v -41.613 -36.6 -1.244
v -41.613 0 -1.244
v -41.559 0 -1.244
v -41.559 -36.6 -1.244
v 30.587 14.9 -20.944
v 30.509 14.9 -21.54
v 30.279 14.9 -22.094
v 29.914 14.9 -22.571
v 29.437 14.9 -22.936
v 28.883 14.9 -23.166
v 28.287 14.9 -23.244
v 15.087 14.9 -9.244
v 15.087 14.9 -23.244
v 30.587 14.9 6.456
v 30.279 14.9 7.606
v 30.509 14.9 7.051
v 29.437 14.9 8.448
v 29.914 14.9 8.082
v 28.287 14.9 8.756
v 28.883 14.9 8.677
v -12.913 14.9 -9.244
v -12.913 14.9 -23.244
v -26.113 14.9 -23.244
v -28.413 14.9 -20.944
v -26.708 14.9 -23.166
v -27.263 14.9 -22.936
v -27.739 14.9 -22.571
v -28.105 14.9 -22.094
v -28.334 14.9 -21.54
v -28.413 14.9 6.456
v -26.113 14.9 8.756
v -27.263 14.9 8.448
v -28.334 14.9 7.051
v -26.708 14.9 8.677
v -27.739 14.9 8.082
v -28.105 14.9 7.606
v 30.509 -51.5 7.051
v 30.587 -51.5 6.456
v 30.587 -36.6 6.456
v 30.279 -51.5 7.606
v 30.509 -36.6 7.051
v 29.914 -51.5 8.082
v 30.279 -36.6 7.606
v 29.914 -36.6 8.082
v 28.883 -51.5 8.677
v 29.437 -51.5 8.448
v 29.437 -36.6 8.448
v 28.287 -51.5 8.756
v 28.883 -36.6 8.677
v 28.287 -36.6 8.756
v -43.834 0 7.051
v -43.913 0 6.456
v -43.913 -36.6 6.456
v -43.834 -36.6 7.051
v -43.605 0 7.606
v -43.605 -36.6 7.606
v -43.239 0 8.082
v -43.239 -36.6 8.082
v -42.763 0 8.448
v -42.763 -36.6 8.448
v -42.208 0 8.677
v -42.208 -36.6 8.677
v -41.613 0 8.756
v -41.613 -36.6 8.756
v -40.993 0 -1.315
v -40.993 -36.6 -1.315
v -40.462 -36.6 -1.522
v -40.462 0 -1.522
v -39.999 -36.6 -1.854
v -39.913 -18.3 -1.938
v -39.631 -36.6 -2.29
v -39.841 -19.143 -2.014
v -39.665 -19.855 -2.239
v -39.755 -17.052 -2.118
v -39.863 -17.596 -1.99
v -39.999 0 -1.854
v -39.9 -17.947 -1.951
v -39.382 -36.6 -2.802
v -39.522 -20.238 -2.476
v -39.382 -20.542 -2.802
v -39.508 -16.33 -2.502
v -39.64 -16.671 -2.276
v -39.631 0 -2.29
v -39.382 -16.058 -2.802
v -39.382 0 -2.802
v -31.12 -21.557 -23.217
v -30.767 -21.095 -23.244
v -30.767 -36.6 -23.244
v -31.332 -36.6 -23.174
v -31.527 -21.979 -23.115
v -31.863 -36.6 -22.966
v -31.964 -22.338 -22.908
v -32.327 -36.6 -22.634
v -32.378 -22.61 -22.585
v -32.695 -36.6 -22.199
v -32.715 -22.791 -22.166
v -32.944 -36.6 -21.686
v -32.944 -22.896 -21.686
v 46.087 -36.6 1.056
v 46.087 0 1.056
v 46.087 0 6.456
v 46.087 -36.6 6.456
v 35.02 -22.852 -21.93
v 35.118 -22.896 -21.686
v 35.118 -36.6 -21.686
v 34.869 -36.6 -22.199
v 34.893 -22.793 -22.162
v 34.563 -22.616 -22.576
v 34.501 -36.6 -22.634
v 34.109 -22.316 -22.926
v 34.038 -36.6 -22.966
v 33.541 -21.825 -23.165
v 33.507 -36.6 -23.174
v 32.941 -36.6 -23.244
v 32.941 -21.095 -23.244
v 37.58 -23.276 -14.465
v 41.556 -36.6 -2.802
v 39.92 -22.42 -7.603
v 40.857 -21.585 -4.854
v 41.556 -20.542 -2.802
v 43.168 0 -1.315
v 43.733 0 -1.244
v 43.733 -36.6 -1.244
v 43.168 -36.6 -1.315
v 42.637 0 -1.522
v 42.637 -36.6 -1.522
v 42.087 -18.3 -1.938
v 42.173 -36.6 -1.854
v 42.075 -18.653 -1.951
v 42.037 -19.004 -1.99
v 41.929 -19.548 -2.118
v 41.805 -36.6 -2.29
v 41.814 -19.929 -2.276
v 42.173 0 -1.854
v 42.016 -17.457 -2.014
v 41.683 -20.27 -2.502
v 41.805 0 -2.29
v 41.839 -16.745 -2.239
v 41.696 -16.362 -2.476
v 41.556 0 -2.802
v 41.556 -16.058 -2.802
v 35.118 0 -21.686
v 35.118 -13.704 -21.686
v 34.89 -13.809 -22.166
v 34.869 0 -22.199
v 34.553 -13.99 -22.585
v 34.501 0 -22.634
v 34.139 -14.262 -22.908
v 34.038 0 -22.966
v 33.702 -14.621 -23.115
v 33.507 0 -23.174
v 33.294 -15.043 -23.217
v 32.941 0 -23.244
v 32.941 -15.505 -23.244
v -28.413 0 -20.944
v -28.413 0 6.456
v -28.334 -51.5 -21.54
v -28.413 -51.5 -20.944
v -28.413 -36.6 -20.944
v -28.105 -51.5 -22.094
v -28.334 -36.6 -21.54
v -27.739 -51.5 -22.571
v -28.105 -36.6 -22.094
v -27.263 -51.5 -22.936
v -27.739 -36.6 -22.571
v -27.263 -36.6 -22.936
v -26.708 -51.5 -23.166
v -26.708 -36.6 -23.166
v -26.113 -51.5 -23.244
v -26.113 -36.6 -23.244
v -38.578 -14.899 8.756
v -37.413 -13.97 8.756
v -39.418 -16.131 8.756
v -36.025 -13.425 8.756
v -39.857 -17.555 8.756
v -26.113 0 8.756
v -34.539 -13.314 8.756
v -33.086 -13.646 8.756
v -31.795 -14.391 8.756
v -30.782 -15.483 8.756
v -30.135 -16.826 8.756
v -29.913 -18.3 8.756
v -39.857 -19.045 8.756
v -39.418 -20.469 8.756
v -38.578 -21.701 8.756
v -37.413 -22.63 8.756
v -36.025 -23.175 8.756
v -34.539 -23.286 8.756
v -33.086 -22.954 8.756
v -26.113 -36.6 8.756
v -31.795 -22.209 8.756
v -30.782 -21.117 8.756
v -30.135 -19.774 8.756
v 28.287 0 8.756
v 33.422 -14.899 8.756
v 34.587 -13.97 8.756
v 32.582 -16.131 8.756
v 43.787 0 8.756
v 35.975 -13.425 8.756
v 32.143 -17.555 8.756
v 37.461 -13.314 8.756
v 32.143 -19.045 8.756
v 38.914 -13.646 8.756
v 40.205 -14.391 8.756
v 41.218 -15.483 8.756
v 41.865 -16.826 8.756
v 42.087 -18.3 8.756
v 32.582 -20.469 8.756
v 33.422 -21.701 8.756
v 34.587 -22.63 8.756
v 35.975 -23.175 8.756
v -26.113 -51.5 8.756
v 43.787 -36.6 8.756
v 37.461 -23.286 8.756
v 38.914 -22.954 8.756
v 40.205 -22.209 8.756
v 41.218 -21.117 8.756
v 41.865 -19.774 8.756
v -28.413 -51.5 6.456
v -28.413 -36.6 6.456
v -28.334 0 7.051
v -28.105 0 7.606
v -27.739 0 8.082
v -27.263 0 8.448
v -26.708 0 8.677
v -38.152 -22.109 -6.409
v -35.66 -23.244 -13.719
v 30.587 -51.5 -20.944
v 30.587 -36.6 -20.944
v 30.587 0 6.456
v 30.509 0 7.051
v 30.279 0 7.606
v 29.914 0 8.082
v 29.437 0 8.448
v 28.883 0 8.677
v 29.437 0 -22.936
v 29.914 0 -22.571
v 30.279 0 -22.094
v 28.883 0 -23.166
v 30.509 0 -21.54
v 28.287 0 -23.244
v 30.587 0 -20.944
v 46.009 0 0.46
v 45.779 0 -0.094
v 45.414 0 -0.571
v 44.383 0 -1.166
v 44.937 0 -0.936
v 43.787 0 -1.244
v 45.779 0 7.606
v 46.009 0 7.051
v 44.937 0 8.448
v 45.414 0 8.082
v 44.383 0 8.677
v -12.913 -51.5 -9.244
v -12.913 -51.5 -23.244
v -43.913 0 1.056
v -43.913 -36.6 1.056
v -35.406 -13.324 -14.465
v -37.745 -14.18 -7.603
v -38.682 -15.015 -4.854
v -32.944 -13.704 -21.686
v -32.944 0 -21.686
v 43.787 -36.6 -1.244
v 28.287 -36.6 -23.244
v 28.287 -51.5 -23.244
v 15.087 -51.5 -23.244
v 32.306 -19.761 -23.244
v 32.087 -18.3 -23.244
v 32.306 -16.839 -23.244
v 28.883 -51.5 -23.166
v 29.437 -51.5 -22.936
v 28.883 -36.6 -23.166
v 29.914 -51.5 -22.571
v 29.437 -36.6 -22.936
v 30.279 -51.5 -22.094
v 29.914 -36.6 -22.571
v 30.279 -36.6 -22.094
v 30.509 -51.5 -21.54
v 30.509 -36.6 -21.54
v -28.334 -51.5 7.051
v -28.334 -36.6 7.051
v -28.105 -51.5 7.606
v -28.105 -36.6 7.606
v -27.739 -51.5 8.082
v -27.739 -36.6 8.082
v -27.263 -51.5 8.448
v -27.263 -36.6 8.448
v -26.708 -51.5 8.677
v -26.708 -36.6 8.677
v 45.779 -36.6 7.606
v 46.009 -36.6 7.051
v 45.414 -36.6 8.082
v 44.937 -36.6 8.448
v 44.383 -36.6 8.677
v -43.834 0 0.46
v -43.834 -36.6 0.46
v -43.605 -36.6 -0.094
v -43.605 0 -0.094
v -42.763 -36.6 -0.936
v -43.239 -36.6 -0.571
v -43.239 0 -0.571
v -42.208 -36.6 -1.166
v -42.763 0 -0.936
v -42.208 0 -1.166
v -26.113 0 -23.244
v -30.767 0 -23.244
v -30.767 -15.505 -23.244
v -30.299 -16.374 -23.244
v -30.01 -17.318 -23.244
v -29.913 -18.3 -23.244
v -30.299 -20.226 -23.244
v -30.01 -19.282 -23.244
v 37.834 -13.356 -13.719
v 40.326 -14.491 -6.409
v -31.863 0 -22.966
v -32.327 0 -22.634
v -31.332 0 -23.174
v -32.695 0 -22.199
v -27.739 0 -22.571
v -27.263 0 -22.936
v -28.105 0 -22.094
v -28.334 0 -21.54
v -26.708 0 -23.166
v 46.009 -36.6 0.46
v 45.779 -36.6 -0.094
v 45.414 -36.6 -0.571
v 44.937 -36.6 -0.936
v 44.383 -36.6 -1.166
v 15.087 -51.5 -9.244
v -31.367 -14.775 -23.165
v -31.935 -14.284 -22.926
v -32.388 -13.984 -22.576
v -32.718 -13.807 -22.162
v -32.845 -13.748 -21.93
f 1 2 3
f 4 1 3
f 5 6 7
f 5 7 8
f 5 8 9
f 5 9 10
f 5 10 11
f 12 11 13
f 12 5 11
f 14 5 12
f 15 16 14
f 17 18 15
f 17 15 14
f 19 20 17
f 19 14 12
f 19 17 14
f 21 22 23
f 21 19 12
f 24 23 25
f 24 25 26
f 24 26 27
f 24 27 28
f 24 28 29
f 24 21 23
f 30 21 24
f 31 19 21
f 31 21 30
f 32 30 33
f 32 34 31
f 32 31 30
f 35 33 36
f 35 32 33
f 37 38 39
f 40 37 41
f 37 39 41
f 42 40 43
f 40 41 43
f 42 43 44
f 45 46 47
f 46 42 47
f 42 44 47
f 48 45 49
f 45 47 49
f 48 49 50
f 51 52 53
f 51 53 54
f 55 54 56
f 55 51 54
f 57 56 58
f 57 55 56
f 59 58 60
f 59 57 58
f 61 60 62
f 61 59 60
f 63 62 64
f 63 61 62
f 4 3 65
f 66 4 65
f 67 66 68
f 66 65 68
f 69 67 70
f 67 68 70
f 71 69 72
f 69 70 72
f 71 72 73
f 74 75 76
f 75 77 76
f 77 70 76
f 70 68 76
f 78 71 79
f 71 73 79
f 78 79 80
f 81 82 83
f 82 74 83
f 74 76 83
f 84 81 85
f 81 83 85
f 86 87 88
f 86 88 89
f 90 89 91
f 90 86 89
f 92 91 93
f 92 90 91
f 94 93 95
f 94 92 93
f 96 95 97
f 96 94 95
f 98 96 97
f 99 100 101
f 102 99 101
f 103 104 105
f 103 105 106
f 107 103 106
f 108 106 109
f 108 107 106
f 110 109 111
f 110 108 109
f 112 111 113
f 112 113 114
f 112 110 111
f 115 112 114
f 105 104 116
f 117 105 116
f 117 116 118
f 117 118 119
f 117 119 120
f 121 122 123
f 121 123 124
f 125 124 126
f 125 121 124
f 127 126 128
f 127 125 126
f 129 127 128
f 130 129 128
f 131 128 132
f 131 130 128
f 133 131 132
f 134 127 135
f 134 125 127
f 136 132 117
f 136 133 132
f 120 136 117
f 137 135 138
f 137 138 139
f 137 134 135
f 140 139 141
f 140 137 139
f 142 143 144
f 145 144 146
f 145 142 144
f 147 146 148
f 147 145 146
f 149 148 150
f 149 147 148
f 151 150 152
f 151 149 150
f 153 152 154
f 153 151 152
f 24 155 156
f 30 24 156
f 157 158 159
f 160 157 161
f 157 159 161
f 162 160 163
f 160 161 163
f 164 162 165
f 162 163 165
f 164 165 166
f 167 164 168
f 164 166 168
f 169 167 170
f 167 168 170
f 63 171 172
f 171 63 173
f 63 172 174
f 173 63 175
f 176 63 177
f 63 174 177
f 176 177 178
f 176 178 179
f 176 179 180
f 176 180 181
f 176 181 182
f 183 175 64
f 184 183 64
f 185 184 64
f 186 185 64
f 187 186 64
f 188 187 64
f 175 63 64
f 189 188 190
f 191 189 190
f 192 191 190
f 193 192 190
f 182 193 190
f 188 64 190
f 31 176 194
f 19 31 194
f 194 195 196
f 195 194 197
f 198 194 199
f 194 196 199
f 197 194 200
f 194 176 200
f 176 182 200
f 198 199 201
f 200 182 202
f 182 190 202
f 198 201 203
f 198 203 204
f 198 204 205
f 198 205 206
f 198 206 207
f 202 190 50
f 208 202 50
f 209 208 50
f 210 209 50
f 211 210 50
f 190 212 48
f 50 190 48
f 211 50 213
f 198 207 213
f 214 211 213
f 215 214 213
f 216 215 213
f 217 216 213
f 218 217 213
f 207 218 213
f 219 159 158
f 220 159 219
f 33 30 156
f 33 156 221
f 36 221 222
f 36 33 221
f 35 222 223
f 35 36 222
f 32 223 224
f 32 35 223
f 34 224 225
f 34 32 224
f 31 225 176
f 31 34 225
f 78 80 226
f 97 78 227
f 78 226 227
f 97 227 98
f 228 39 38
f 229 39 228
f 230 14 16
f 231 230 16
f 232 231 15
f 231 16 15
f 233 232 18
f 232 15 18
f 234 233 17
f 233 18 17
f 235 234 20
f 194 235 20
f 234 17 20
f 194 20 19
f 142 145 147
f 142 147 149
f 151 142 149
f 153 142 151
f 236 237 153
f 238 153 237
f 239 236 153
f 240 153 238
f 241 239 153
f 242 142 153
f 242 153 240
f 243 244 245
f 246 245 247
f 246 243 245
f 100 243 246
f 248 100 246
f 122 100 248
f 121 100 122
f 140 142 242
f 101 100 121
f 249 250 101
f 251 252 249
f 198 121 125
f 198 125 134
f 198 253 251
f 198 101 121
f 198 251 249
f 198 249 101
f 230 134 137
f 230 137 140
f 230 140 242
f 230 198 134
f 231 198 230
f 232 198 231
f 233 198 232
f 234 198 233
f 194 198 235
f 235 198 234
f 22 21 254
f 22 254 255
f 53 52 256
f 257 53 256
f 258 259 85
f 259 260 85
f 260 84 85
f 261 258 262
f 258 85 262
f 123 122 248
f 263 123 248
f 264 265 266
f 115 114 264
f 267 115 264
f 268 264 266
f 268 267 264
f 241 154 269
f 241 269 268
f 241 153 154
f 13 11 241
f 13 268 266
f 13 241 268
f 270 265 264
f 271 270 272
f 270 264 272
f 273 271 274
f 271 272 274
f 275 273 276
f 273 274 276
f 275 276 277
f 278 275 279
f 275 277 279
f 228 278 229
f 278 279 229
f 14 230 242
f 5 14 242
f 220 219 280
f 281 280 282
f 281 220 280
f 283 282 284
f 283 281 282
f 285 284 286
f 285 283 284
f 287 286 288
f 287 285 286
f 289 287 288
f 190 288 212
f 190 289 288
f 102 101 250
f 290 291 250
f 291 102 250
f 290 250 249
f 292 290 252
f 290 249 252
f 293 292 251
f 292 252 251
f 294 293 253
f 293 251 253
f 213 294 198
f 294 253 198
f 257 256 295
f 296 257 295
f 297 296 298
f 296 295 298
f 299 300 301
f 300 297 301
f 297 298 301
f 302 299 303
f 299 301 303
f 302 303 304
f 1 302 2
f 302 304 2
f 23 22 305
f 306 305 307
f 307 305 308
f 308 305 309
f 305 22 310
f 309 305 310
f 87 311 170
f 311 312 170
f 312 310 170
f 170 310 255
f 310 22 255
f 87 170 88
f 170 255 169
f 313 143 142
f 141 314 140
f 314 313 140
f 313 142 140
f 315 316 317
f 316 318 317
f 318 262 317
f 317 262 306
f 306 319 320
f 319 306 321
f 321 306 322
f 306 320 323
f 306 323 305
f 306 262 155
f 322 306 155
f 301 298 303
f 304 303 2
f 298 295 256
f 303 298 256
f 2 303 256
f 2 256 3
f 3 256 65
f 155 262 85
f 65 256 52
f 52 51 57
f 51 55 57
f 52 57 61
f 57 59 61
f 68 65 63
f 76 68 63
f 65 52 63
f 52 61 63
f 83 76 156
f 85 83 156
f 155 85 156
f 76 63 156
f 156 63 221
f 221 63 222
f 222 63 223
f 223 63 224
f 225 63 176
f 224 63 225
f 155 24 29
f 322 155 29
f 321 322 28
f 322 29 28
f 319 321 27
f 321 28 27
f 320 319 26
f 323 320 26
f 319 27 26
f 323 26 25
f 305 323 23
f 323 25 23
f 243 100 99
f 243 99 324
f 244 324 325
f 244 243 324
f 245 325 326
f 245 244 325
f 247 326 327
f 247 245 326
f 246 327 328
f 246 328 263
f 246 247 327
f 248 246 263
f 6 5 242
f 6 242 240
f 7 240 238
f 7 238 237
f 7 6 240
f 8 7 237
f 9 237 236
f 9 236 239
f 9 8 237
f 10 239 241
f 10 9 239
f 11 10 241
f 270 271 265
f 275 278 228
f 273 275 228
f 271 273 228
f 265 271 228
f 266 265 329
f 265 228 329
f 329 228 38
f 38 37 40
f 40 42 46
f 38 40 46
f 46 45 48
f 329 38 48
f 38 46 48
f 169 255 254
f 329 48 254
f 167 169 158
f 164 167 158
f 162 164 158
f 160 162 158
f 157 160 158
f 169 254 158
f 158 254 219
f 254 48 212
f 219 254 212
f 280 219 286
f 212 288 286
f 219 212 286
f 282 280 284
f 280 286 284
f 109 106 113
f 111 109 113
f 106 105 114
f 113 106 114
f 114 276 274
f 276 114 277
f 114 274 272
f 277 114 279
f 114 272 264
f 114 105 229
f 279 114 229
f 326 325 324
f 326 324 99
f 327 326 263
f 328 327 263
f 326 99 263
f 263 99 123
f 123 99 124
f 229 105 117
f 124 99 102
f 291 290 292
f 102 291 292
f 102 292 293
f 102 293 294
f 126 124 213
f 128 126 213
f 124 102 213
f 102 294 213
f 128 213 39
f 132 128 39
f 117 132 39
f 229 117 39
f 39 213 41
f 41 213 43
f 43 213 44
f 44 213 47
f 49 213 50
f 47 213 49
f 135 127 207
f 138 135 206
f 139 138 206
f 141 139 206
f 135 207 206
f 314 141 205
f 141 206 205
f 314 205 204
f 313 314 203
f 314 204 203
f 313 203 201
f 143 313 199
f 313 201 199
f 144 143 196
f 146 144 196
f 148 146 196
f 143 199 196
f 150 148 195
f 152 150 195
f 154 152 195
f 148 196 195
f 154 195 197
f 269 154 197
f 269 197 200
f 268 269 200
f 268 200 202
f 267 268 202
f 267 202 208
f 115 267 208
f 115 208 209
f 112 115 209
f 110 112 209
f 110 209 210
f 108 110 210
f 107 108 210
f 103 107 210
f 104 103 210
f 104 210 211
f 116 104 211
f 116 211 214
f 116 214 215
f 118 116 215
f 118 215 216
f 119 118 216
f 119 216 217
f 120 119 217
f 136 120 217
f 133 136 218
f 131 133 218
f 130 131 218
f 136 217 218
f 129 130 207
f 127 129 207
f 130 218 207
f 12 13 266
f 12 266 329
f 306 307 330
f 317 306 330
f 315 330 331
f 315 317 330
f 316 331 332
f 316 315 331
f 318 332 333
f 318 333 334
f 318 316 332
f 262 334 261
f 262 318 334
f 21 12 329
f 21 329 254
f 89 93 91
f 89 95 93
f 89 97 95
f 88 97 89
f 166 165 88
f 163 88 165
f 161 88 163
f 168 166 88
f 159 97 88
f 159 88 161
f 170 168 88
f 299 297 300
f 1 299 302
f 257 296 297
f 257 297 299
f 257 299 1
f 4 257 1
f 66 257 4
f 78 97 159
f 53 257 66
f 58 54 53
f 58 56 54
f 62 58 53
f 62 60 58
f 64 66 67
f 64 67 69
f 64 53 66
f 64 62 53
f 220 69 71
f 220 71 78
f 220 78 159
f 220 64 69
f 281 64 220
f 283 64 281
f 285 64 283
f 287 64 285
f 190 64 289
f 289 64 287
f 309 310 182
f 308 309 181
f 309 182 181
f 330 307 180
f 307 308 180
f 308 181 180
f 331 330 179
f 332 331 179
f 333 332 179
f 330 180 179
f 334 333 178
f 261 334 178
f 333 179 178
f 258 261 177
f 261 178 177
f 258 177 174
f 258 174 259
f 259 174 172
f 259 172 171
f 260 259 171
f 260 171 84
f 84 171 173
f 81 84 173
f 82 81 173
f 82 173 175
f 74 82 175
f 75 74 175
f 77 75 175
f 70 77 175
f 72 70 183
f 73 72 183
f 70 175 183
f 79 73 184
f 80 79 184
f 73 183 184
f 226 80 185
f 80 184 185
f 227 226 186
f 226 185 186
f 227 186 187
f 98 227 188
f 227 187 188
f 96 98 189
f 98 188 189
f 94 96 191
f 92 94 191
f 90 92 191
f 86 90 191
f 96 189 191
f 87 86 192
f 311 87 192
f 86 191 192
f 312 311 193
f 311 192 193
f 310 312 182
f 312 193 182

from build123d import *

# Parameters (mm, degrees)
F1_DEPTH      = 36.6
F3_DEPTH      = 14.9
F3_DEPTH_BACK = 51.5
F4_R          = 5
F5_DEPTH      = 32.001
F6_T4_DEPTH   = 18.3
F6_S5_R       = 5
F6_T6_DEPTH   = 11
F6_T10_DEPTH  = 18.3
F6_S11_R      = 5
F6_T12_DEPTH  = 11
F6_T16_DEPTH  = 18.3
F6_S17_R      = 5
F6_T18_DEPTH  = 11
F6_T22_DEPTH  = 18.3
F6_S23_R      = 5
F6_T24_DEPTH  = 11
F6_T25_DEPTH  = 48.1
F6_T27_DEPTH  = 22.1993140666
F6_T29_DEPTH  = 22.1993140666
F6_T31_DEPTH  = 20.65
F6_T33_DEPTH  = 20.65


# Not quite as in the source:
# - a fillet or chamfer that OpenCascade refuses, or shapes differently, is made with other operations: its cross-section is extruded or revolved along the edge and cut away or added


with BuildPart() as f1:
    # F0 (on Front) → F1 (new body)
    with BuildSketch(Plane.XZ):
        Polygon((-28.4127721637, 8.7557665049), (-43.9127721637, 8.7557665049), (-43.9127721637, -1.2442334951), (-39.9127721637, -1.2442334951), (-32.4127721637, -23.2442334951), (-28.4127721637, -23.2442334951), align=None)
        Polygon((30.5872278363, 8.7557665049), (-28.4127721637, 8.7557665049), (-28.4127721637, -23.2442334951), (-12.9127721637, -23.2442334951), (-12.9127721637, -9.2442334951), (15.0872278363, -9.2442334951), (15.0872278363, -23.2442334951), (30.5872278363, -23.2442334951), align=None)
        Polygon((46.0872278363, 8.7557665049), (30.5872278363, 8.7557665049), (30.5872278363, -23.2442334951), (34.5872278363, -23.2442334951), (42.0872278363, -1.2442334951), (46.0872278363, -1.2442334951), align=None)
    extrude(amount=F1_DEPTH)

    # F2 (on face) → F3 (join, two sides)
    with BuildSketch(Plane(origin=(0, 0, 0), x_dir=(-1, 0, 0), z_dir=(0, 1, 0))) as f3_sk:
        Polygon((28.4127721637, 8.7557665049), (-30.5872278363, 8.7557665049), (-30.5872278363, -23.2442334951), (-15.0872278363, -23.2442334951), (-15.0872278363, -9.2442334951), (12.9127721637, -9.2442334951), (12.9127721637, -23.2442334951), (28.4127721637, -23.2442334951), align=None)
    extrude(amount=F3_DEPTH)
    extrude(f3_sk.sketch, amount=-F3_DEPTH_BACK)

    # F4 (on face) → F5 (cut, through all)
    with BuildSketch(Plane.XY.offset(8.7557665049)):
        with Locations((-34.9127721637, -18.3)):
            Circle(F4_R)
        with Locations((37.0872278363, -18.3)):
            Circle(F4_R)
    extrude(amount=-F5_DEPTH, mode=Mode.SUBTRACT)

    # F6: fillet of radius 2.3 on 20 edges, made by hand


with BuildPart() as f6_tool2:
    # F6_s3 → F6_t4 (new body)
    with BuildSketch(Plane.XZ.offset(18.3)):
        with BuildLine():
            ThreePointArc((-41.5586603808, -1.2442334951), (-40.2201808476, -1.6738130774), (-39.381686948, -2.8020834612))
            Line((-39.381686948, -2.8020834612), (-39.9127721637, -1.2442334951))
            Line((-39.9127721637, -1.2442334951), (-41.5586603808, -1.2442334951))
        make_face()
    extrude(amount=F6_T4_DEPTH)

    # F6_s5 → F6_t6 (cut, symmetric)
    with BuildSketch(Plane.XY.offset(-2)):
        with Locations((-34.9127721637, -18.3)):
            Circle(F6_S5_R)
    extrude(amount=F6_T6_DEPTH, both=True, mode=Mode.SUBTRACT)


with BuildPart() as f1_1:
    add(f1.part)

    # F6_t1: union F6_tool2
    add(f6_tool2.part)


with BuildPart() as f6_tool8:
    # F6_s9 → F6_t10 (new body)
    with BuildSketch(Plane.XZ.offset(18.3)):
        with BuildLine():
            ThreePointArc((43.7331160534, -1.2442334951), (42.3946365201, -1.6738130774), (41.5561426205, -2.8020834612))
            Line((41.5561426205, -2.8020834612), (42.0872278363, -1.2442334951))
            Line((42.0872278363, -1.2442334951), (43.7331160534, -1.2442334951))
        make_face()
    extrude(amount=F6_T10_DEPTH)

    # F6_s11 → F6_t12 (cut, symmetric)
    with BuildSketch(Plane.XY.offset(-2)):
        with Locations((37.0872278363, -18.3)):
            Circle(F6_S11_R)
    extrude(amount=F6_T12_DEPTH, both=True, mode=Mode.SUBTRACT)


with BuildPart() as f1_2:
    add(f1_1.part)

    # F6_t7: union F6_tool8
    add(f6_tool8.part)


with BuildPart() as f6_tool14:
    # F6_s15 → F6_t16 (new body)
    with BuildSketch(Plane.XZ):
        with BuildLine():
            ThreePointArc((43.7331160534, -1.2442334951), (42.3946365201, -1.6738130774), (41.5561426205, -2.8020834612))
            Line((41.5561426205, -2.8020834612), (42.0872278363, -1.2442334951))
            Line((42.0872278363, -1.2442334951), (43.7331160534, -1.2442334951))
        make_face()
    extrude(amount=F6_T16_DEPTH)

    # F6_s17 → F6_t18 (cut, symmetric)
    with BuildSketch(Plane.XY.offset(-2)):
        with Locations((37.0872278363, -18.3)):
            Circle(F6_S17_R)
    extrude(amount=F6_T18_DEPTH, both=True, mode=Mode.SUBTRACT)


with BuildPart() as f1_3:
    add(f1_2.part)

    # F6_t13: union F6_tool14
    add(f6_tool14.part)


with BuildPart() as f6_tool20:
    # F6_s21 → F6_t22 (new body)
    with BuildSketch(Plane.XZ):
        with BuildLine():
            ThreePointArc((-41.5586603808, -1.2442334951), (-40.2201808476, -1.6738130774), (-39.381686948, -2.8020834612))
            Line((-39.381686948, -2.8020834612), (-39.9127721637, -1.2442334951))
            Line((-39.9127721637, -1.2442334951), (-41.5586603808, -1.2442334951))
        make_face()
    extrude(amount=F6_T22_DEPTH)

    # F6_s23 → F6_t24 (cut, symmetric)
    with BuildSketch(Plane.XY.offset(-2)):
        with Locations((-34.9127721637, -18.3)):
            Circle(F6_S23_R)
    extrude(amount=F6_T24_DEPTH, both=True, mode=Mode.SUBTRACT)


with BuildPart() as f1_4:
    add(f1_3.part)

    # F6_t19: union F6_tool20
    add(f6_tool20.part)

    # F6_s26 → F6_t25 (cut)
    with BuildSketch(Plane.XZ.offset(-5.75)):
        with BuildLine():
            ThreePointArc((-43.9127721637, 1.0557665049), (-43.2391177605, -0.5705790919), (-41.6127721637, -1.2442334951))
            Line((-41.6127721637, -1.2442334951), (-43.9127721637, -1.2442334951))
            Line((-43.9127721637, -1.2442334951), (-43.9127721637, 1.0557665049))
        make_face()
        with BuildLine():
            ThreePointArc((-43.9127721637, 6.4557665049), (-43.2391177605, 8.0821121016), (-41.6127721637, 8.7557665049))
            Line((-41.6127721637, 8.7557665049), (-43.9127721637, 8.7557665049))
            Line((-43.9127721637, 8.7557665049), (-43.9127721637, 6.4557665049))
        make_face()
        with BuildLine():
            ThreePointArc((46.0872278363, 6.4557665049), (45.413573433, 8.0821121016), (43.7872278363, 8.7557665049))
            Line((43.7872278363, 8.7557665049), (46.0872278363, 8.7557665049))
            Line((46.0872278363, 8.7557665049), (46.0872278363, 6.4557665049))
        make_face()
        with BuildLine():
            ThreePointArc((46.0872278363, 1.0557665049), (45.413573433, -0.5705790919), (43.7872278363, -1.2442334951))
            Line((43.7872278363, -1.2442334951), (46.0872278363, -1.2442334951))
            Line((46.0872278363, -1.2442334951), (46.0872278363, 1.0557665049))
        make_face()
    extrude(amount=F6_T25_DEPTH, mode=Mode.SUBTRACT)

    # F6_s28 → F6_t27 (cut)
    with BuildSketch(Plane.XZ.offset(18.5154064762)):
        with BuildLine():
            ThreePointArc((-30.7668839466, -23.2442334951), (-32.1053634799, -22.8146539129), (-32.9438573795, -21.6863835291))
            Line((-32.9438573795, -21.6863835291), (-32.4127721637, -23.2442334951))
            Line((-32.4127721637, -23.2442334951), (-30.7668839466, -23.2442334951))
        make_face()
        with BuildLine():
            ThreePointArc((35.118313052, -21.6863835291), (34.2798191524, -22.8146539129), (32.9413396192, -23.2442334951))
            Line((32.9413396192, -23.2442334951), (34.5872278363, -23.2442334951))
            Line((34.5872278363, -23.2442334951), (35.118313052, -21.6863835291))
        make_face()
    extrude(amount=F6_T27_DEPTH, mode=Mode.SUBTRACT)

    # F6_s30 → F6_t29 (cut)
    with BuildSketch(Plane.XZ.offset(-4.1147205427)):
        with BuildLine():
            ThreePointArc((-30.7668839466, -23.2442334951), (-32.1053634799, -22.8146539129), (-32.9438573795, -21.6863835291))
            Line((-32.9438573795, -21.6863835291), (-32.4127721637, -23.2442334951))
            Line((-32.4127721637, -23.2442334951), (-30.7668839466, -23.2442334951))
        make_face()
        with BuildLine():
            ThreePointArc((35.118313052, -21.6863835291), (34.2798191524, -22.8146539129), (32.9413396192, -23.2442334951))
            Line((32.9413396192, -23.2442334951), (34.5872278363, -23.2442334951))
            Line((34.5872278363, -23.2442334951), (35.118313052, -21.6863835291))
        make_face()
    extrude(amount=F6_T29_DEPTH, mode=Mode.SUBTRACT)

    # F6_s32 → F6_t31 (cut)
    with BuildSketch(Plane.XZ.offset(36.6)):
        with BuildLine():
            ThreePointArc((-28.4127721637, -20.9442334951), (-27.7391177605, -22.5705790919), (-26.1127721637, -23.2442334951))
            Line((-26.1127721637, -23.2442334951), (-28.4127721637, -23.2442334951))
            Line((-28.4127721637, -23.2442334951), (-28.4127721637, -20.9442334951))
        make_face()
        with BuildLine():
            ThreePointArc((-28.4127721637, 6.4557665049), (-27.7391177605, 8.0821121016), (-26.1127721637, 8.7557665049))
            Line((-26.1127721637, 8.7557665049), (-28.4127721637, 8.7557665049))
            Line((-28.4127721637, 8.7557665049), (-28.4127721637, 6.4557665049))
        make_face()
        with BuildLine():
            ThreePointArc((30.5872278363, 6.4557665049), (29.913573433, 8.0821121016), (28.2872278363, 8.7557665049))
            Line((28.2872278363, 8.7557665049), (30.5872278363, 8.7557665049))
            Line((30.5872278363, 8.7557665049), (30.5872278363, 6.4557665049))
        make_face()
        with BuildLine():
            ThreePointArc((28.2872278363, -23.2442334951), (29.913573433, -22.5705790919), (30.5872278363, -20.9442334951))
            Line((30.5872278363, -20.9442334951), (30.5872278363, -23.2442334951))
            Line((30.5872278363, -23.2442334951), (28.2872278363, -23.2442334951))
        make_face()
    extrude(amount=F6_T31_DEPTH, mode=Mode.SUBTRACT)

    # F6_s34 → F6_t33 (cut)
    with BuildSketch(Plane.XZ.offset(-20.65)):
        with BuildLine():
            ThreePointArc((-28.4127721637, -20.9442334951), (-27.7391177605, -22.5705790919), (-26.1127721637, -23.2442334951))
            Line((-26.1127721637, -23.2442334951), (-28.4127721637, -23.2442334951))
            Line((-28.4127721637, -23.2442334951), (-28.4127721637, -20.9442334951))
        make_face()
        with BuildLine():
            ThreePointArc((-28.4127721637, 6.4557665049), (-27.7391177605, 8.0821121016), (-26.1127721637, 8.7557665049))
            Line((-26.1127721637, 8.7557665049), (-28.4127721637, 8.7557665049))
            Line((-28.4127721637, 8.7557665049), (-28.4127721637, 6.4557665049))
        make_face()
        with BuildLine():
            ThreePointArc((30.5872278363, 6.4557665049), (29.913573433, 8.0821121016), (28.2872278363, 8.7557665049))
            Line((28.2872278363, 8.7557665049), (30.5872278363, 8.7557665049))
            Line((30.5872278363, 8.7557665049), (30.5872278363, 6.4557665049))
        make_face()
        with BuildLine():
            ThreePointArc((30.5872278363, -20.9442334951), (29.913573433, -22.5705790919), (28.2872278363, -23.2442334951))
            Line((28.2872278363, -23.2442334951), (30.5872278363, -23.2442334951))
            Line((30.5872278363, -23.2442334951), (30.5872278363, -20.9442334951))
        make_face()
    extrude(amount=F6_T33_DEPTH, mode=Mode.SUBTRACT)


solid = f1_4.part
